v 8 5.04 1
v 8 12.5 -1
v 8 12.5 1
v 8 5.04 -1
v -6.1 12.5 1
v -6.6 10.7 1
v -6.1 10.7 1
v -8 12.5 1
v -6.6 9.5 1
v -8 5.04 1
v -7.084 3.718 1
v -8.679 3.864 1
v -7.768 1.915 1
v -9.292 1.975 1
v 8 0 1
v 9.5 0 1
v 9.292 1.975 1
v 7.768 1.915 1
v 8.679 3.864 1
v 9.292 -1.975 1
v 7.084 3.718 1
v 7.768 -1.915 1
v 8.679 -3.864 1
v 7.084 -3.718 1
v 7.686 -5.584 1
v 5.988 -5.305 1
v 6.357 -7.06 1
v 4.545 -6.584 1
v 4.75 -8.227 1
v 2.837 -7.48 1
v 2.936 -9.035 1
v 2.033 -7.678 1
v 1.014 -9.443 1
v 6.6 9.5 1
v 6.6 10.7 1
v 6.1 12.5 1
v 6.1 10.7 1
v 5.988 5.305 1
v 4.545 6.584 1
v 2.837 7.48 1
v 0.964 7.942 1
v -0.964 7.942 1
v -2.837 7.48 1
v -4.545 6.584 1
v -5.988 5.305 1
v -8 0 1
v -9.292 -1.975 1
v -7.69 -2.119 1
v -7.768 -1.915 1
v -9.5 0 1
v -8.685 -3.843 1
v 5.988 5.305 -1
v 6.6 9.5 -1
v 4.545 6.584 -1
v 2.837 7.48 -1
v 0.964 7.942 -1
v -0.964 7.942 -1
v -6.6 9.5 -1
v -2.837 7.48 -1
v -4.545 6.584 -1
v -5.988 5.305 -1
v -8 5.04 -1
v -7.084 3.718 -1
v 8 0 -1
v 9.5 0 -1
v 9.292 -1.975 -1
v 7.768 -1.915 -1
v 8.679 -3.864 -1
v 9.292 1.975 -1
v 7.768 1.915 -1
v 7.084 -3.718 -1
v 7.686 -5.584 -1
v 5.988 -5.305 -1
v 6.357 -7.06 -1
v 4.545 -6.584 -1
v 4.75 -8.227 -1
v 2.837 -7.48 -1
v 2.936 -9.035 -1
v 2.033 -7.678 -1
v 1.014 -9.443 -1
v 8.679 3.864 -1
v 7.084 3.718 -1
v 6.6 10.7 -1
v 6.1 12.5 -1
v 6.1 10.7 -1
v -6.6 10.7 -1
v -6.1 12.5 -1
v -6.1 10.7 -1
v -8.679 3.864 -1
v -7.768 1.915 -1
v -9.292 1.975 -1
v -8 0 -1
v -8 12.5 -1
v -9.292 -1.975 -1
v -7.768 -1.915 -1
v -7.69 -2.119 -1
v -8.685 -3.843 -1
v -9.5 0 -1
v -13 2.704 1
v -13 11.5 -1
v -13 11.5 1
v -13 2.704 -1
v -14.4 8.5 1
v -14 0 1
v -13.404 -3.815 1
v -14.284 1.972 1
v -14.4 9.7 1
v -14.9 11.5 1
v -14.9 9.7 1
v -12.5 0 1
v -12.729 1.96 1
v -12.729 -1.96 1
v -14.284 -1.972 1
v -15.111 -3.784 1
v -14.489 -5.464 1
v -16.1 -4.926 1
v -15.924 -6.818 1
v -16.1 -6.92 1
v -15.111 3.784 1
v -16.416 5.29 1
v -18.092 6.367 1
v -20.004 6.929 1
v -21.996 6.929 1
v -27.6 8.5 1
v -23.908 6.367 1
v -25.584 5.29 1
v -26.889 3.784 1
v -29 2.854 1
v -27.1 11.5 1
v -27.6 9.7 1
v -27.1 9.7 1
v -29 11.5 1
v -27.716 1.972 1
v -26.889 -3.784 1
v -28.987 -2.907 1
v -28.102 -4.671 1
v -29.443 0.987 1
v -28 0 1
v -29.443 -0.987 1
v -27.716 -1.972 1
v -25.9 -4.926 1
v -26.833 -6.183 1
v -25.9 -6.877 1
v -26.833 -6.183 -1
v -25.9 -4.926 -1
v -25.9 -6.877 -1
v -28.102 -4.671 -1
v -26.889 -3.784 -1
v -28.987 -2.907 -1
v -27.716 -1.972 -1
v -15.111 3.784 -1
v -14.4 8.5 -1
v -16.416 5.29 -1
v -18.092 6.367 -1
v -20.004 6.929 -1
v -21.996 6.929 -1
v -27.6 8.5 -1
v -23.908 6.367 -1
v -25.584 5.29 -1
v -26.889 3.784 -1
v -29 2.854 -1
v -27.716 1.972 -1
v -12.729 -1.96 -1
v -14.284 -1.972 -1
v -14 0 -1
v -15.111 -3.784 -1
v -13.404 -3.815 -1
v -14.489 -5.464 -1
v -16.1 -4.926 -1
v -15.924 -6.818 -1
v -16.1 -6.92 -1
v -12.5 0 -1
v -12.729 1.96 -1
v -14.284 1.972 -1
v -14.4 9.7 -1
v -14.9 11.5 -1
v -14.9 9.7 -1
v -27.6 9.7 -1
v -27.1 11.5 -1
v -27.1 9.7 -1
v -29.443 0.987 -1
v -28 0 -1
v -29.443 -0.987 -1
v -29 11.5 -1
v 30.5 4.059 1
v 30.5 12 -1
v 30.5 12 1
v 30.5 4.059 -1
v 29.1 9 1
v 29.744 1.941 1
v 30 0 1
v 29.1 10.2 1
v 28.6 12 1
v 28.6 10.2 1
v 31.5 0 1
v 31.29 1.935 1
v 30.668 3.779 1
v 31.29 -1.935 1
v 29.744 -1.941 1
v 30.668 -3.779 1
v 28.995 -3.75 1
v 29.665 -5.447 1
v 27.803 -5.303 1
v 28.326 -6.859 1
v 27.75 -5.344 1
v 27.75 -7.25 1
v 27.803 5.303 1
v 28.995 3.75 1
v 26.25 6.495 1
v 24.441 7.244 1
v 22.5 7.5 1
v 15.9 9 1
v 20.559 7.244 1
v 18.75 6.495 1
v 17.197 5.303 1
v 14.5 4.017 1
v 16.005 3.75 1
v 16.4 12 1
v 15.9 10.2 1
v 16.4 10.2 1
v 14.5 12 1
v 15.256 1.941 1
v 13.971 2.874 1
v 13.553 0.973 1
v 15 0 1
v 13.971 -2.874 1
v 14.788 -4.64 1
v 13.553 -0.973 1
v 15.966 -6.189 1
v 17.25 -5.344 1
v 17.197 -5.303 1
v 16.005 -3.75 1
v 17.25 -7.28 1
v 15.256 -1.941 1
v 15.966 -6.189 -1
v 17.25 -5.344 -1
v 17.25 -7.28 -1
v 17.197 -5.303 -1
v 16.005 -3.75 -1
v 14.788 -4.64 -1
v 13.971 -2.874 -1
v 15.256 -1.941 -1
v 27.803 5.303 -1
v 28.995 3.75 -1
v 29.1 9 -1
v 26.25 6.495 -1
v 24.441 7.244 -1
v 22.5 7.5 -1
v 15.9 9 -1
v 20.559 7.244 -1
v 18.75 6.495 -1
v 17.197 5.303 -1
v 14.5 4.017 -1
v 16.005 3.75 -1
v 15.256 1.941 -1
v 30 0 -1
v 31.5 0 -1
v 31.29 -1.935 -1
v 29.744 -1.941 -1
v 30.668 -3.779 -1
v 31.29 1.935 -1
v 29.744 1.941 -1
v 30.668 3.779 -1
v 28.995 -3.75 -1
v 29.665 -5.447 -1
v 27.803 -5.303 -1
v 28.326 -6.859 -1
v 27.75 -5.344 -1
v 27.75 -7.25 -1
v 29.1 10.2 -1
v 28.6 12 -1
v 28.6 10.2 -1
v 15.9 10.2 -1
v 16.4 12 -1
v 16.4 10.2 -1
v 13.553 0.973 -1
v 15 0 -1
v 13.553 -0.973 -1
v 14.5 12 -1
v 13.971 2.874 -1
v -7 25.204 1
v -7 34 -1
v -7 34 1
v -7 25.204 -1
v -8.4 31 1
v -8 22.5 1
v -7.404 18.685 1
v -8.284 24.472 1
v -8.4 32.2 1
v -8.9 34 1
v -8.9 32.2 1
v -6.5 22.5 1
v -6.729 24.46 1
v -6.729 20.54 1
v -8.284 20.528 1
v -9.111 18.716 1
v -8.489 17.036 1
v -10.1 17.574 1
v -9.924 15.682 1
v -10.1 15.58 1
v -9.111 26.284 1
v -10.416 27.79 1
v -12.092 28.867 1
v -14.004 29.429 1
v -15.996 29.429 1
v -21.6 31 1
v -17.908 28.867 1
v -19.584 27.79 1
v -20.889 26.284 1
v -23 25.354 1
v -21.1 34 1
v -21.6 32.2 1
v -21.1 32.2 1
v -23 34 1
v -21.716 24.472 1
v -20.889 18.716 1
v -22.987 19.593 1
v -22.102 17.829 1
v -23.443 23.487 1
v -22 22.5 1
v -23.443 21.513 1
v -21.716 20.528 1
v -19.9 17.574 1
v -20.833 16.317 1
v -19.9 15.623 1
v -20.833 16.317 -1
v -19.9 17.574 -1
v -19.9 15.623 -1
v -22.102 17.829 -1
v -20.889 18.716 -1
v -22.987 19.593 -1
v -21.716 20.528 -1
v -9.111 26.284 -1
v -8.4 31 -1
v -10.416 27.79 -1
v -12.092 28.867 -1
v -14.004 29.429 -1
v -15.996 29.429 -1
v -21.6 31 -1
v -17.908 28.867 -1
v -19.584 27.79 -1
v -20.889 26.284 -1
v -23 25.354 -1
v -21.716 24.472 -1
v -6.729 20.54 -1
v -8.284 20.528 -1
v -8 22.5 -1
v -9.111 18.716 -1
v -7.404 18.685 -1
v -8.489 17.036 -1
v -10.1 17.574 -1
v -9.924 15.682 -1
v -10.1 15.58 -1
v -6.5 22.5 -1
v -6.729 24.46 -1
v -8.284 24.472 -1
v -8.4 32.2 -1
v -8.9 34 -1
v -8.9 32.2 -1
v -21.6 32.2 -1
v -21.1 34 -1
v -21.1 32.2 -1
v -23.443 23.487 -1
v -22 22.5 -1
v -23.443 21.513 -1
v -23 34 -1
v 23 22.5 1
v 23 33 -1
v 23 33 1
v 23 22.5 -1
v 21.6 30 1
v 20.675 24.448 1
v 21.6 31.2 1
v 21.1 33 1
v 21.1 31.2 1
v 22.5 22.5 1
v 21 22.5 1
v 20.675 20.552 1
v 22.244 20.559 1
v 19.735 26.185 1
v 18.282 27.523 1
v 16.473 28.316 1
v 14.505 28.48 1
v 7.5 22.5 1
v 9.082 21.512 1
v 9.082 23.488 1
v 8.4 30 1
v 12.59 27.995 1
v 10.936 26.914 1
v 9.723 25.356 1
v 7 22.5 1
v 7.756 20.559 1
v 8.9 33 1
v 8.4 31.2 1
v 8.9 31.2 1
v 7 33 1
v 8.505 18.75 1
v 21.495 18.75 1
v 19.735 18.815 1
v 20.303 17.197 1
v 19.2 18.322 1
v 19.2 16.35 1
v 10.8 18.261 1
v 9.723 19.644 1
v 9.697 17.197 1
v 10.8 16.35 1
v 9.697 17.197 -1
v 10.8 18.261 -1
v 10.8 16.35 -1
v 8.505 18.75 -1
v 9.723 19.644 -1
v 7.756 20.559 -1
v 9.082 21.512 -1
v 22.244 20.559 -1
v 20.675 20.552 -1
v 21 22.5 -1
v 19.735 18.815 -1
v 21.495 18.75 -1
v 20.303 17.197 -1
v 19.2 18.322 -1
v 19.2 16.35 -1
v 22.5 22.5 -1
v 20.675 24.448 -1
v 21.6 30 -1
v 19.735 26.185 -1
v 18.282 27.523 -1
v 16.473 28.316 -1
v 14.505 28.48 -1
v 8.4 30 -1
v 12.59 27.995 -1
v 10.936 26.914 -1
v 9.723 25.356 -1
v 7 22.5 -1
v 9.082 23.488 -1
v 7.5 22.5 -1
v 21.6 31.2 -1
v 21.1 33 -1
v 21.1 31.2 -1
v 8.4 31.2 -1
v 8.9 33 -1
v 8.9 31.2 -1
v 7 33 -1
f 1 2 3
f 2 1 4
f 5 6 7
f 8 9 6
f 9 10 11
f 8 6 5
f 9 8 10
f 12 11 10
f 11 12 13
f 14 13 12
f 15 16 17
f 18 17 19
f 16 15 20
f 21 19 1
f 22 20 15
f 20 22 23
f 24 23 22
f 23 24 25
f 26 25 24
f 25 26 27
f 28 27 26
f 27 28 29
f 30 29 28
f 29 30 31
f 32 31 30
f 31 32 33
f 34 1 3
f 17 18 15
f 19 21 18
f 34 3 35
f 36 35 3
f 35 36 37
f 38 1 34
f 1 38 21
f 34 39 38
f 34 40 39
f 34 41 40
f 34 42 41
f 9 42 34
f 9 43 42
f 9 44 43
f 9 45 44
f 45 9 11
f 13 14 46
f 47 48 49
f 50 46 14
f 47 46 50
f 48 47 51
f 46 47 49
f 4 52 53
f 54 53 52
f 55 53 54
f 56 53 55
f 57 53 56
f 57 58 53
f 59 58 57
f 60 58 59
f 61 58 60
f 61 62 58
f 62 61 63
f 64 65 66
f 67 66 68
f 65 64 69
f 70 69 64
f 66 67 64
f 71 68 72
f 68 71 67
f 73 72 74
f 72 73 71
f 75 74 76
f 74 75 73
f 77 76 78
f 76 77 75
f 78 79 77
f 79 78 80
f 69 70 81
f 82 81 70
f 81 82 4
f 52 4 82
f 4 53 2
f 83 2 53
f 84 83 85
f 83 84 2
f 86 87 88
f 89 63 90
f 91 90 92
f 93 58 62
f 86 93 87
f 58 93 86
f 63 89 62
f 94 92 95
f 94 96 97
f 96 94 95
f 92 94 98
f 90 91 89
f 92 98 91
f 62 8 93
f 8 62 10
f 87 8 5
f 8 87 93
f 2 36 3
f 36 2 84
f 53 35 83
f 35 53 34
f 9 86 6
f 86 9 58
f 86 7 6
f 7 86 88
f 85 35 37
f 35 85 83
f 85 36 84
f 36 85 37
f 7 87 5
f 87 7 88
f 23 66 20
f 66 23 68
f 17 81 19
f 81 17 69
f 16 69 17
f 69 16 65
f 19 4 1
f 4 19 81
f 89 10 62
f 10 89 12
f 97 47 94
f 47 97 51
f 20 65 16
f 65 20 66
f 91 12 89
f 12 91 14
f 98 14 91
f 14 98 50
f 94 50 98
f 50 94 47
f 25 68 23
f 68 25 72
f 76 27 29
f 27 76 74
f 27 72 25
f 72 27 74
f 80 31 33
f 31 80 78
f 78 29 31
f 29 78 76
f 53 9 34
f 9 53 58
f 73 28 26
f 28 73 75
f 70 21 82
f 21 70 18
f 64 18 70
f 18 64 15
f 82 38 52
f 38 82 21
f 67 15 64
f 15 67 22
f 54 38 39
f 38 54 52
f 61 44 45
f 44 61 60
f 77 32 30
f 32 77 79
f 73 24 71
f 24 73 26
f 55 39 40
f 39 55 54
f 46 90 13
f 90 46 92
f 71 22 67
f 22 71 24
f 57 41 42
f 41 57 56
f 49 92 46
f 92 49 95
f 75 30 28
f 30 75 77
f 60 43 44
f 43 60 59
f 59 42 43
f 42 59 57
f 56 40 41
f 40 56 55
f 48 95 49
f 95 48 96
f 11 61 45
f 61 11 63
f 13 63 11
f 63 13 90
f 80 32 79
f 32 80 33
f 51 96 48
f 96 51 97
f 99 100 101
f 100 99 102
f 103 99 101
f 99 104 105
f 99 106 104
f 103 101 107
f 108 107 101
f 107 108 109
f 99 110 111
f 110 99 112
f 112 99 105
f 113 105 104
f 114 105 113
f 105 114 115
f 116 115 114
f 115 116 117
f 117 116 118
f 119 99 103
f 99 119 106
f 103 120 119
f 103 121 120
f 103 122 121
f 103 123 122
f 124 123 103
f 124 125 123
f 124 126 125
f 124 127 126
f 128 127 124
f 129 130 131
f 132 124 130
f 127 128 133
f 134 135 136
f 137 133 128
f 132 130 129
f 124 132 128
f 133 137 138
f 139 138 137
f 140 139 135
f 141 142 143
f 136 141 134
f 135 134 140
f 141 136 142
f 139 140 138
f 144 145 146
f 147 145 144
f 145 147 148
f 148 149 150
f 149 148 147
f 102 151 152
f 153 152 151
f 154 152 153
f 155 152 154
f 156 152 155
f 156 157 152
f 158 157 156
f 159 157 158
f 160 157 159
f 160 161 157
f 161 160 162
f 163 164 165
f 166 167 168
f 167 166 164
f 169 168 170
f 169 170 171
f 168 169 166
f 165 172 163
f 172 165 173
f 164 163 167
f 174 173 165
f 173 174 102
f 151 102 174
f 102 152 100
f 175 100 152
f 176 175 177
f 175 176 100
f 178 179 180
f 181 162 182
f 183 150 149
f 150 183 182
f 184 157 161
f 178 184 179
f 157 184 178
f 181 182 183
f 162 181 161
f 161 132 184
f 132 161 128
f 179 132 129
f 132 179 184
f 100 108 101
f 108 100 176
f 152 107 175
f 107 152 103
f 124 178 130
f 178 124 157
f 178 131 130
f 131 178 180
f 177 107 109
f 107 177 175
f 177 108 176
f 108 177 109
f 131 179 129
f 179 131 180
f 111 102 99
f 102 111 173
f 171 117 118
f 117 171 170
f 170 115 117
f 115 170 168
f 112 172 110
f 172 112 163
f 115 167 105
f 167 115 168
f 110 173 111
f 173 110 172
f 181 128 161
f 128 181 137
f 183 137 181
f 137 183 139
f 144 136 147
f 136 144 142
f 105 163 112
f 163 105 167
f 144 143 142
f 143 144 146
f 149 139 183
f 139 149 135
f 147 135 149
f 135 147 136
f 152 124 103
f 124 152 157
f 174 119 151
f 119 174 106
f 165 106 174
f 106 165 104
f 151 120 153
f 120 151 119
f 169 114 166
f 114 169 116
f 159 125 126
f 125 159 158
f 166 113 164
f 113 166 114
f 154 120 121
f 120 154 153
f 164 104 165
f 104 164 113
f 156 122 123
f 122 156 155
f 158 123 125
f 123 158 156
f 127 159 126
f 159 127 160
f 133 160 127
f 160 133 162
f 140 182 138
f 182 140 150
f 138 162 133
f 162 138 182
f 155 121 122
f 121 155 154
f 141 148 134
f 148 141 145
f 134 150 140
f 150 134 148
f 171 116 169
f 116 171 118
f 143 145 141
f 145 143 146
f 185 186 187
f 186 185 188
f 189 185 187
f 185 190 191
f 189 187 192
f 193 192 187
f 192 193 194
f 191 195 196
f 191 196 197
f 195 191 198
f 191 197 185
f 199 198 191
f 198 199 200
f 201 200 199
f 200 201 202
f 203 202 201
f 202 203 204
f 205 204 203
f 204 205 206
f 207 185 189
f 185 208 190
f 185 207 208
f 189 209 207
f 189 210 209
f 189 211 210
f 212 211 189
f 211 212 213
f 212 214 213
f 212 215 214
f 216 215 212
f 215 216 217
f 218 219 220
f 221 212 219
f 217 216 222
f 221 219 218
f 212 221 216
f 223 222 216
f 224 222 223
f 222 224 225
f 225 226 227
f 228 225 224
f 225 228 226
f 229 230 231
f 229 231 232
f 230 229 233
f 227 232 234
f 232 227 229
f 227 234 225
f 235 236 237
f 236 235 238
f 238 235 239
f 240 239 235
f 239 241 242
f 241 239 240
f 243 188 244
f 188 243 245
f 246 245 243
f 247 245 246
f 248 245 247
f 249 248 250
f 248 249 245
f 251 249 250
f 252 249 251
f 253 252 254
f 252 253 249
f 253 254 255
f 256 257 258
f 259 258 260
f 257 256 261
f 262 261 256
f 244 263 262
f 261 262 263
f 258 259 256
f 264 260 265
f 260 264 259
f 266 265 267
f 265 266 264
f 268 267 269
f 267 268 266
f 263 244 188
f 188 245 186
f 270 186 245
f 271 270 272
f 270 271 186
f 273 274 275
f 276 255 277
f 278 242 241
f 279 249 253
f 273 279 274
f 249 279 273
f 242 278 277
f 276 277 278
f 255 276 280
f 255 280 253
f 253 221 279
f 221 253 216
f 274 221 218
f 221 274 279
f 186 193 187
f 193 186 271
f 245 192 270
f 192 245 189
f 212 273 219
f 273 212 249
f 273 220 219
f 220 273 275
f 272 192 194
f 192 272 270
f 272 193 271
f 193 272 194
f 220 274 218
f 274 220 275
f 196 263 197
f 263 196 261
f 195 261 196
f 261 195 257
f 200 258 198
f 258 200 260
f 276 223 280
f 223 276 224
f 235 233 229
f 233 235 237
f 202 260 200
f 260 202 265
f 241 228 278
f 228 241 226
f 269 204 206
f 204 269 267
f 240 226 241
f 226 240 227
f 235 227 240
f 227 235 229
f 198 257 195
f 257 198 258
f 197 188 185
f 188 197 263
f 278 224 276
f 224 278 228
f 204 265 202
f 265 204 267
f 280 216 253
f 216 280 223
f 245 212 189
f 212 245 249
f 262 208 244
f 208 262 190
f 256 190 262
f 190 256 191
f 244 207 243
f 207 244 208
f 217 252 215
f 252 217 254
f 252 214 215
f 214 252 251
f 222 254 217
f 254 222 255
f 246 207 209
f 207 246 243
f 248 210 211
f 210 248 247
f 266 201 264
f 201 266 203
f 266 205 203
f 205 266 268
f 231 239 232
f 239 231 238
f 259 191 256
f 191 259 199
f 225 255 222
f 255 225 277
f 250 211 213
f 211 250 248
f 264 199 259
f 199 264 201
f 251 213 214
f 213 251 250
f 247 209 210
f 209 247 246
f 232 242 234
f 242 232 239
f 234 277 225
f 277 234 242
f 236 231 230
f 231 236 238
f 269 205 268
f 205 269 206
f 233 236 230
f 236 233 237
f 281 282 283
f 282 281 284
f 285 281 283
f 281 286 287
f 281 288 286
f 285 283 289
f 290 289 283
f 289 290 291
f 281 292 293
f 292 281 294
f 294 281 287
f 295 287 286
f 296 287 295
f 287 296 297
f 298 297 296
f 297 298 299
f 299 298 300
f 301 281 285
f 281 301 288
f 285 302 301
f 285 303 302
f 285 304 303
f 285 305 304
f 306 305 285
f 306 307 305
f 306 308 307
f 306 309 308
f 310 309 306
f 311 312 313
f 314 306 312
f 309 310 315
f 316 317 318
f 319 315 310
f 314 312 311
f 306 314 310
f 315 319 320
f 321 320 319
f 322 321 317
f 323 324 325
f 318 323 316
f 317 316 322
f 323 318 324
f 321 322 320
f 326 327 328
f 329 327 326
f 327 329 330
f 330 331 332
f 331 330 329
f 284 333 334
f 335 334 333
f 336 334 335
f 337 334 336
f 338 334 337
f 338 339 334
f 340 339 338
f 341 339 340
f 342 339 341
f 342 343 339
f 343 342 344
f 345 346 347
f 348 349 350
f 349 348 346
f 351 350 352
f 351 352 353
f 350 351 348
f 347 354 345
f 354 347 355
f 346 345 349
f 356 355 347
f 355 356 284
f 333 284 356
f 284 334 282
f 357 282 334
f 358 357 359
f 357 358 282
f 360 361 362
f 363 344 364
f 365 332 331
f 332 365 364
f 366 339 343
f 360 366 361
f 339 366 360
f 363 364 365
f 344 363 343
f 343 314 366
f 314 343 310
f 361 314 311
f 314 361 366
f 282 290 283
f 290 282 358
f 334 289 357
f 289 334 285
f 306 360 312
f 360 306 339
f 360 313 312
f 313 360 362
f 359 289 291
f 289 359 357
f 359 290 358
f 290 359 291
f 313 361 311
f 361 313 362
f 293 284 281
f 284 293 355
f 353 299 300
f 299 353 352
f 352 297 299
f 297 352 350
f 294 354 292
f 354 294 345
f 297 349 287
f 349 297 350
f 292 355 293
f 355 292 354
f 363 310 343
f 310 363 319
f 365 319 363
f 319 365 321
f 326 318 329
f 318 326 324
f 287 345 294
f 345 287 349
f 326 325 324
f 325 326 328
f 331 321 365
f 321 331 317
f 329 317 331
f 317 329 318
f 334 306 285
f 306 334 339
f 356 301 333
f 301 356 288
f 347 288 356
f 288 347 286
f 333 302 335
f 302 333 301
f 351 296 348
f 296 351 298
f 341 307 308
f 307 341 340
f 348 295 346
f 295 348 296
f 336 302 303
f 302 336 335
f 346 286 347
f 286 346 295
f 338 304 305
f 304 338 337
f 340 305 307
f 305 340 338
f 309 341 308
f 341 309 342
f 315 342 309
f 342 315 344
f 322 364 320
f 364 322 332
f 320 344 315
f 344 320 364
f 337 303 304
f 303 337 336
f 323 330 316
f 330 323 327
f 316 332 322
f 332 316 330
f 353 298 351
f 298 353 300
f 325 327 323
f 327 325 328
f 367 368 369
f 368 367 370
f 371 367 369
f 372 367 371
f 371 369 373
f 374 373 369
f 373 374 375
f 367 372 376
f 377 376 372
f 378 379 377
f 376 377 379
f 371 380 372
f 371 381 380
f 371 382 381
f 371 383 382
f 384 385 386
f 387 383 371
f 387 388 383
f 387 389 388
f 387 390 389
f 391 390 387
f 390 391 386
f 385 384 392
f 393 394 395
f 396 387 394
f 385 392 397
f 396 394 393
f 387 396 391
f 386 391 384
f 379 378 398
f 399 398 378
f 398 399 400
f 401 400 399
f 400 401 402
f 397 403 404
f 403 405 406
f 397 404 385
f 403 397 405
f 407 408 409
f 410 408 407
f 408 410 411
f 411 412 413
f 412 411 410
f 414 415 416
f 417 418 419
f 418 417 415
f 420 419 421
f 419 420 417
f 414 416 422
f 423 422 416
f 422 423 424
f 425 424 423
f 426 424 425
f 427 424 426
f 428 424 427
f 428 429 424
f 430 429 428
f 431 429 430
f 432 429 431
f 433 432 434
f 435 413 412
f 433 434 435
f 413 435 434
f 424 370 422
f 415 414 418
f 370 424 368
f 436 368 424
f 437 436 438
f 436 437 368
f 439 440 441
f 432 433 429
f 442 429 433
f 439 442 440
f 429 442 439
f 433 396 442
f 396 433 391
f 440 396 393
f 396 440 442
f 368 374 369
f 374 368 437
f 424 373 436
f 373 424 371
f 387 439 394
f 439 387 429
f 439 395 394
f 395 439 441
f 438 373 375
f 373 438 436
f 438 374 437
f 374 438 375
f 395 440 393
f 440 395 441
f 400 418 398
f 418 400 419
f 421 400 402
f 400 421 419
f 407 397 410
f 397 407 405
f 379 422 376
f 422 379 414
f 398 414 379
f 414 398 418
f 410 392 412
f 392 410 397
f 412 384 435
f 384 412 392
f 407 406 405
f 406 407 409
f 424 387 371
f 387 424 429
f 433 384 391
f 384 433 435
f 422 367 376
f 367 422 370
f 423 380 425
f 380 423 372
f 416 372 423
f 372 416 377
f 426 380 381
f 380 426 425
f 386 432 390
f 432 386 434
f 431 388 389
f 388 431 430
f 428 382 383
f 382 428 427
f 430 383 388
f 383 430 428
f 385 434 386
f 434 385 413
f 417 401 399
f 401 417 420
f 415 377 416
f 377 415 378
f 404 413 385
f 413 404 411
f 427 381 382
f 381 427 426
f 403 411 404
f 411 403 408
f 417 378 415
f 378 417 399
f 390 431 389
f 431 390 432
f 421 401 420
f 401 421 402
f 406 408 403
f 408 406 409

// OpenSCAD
overlap = 0.001;
thumb_dia = 16;
index_dia = 14;
middle_dia = 15;
ring_dia = 14;
pinky_dia = 12;

// TODO:
// - fillets

module ring(inner_diameter, tolerance=0.2, hole_angle=0){
    tol = tolerance;
    strength = 3;
    outer_diameter = inner_diameter + strength;
    thickness = 2;
    pcb_width = 13;
    pcb_height = 1;
    catch_wall = 1.5;
    catch_width = pcb_width + 2*catch_wall;
    catch_overhang = 0.5;
    prong_height = 2;
    catch_height = pcb_height + prong_height;
    
    difference(){
    union(){
    cylinder(h = thickness, r=outer_diameter/2, center=true); // Outer ring
    difference(){
    translate([-catch_width/2,outer_diameter/2,-thickness/2])cube([catch_width, catch_height, thickness]); // sense unit holder base
    
    translate([0,outer_diameter/2+(pcb_height+tol)/2, 0])cube([pcb_width+tol,pcb_height+tol,thickness], center = true);// pcb
    translate([0,outer_diameter/2+catch_height-prong_height/2-overlap, 0])cube([pcb_width-catch_overhang*2+tol,prong_height+2*overlap,thickness], center = true); // overhang cutout
    }
    #translate([0,outer_diameter/4,0])cube([catch_width, outer_diameter/2+overlap, thickness],center=true); // join sense unit holder to rin
    }
    cylinder(h=thickness, r=inner_diameter/2, center=true); // Ring hole
    
    // hole maker
    rotate([0,0,hole_angle])translate([0,-outer_diameter/2, 0])cube([inner_diameter*0.7,outer_diameter,thickness], center=true);
    }
    
}

// Thumb
ring(thumb_dia, hole_angle=-30);
// Index
translate([-index_dia*1.5,0,0])
ring(index_dia);

// Middle
translate([middle_dia*1.5,0,0])
ring(middle_dia);

// Ring
translate([-middle_dia,middle_dia*1.5,0])
ring(ring_dia);

// Pinky
translate([middle_dia,middle_dia*1.5,0])
ring(pinky_dia);
